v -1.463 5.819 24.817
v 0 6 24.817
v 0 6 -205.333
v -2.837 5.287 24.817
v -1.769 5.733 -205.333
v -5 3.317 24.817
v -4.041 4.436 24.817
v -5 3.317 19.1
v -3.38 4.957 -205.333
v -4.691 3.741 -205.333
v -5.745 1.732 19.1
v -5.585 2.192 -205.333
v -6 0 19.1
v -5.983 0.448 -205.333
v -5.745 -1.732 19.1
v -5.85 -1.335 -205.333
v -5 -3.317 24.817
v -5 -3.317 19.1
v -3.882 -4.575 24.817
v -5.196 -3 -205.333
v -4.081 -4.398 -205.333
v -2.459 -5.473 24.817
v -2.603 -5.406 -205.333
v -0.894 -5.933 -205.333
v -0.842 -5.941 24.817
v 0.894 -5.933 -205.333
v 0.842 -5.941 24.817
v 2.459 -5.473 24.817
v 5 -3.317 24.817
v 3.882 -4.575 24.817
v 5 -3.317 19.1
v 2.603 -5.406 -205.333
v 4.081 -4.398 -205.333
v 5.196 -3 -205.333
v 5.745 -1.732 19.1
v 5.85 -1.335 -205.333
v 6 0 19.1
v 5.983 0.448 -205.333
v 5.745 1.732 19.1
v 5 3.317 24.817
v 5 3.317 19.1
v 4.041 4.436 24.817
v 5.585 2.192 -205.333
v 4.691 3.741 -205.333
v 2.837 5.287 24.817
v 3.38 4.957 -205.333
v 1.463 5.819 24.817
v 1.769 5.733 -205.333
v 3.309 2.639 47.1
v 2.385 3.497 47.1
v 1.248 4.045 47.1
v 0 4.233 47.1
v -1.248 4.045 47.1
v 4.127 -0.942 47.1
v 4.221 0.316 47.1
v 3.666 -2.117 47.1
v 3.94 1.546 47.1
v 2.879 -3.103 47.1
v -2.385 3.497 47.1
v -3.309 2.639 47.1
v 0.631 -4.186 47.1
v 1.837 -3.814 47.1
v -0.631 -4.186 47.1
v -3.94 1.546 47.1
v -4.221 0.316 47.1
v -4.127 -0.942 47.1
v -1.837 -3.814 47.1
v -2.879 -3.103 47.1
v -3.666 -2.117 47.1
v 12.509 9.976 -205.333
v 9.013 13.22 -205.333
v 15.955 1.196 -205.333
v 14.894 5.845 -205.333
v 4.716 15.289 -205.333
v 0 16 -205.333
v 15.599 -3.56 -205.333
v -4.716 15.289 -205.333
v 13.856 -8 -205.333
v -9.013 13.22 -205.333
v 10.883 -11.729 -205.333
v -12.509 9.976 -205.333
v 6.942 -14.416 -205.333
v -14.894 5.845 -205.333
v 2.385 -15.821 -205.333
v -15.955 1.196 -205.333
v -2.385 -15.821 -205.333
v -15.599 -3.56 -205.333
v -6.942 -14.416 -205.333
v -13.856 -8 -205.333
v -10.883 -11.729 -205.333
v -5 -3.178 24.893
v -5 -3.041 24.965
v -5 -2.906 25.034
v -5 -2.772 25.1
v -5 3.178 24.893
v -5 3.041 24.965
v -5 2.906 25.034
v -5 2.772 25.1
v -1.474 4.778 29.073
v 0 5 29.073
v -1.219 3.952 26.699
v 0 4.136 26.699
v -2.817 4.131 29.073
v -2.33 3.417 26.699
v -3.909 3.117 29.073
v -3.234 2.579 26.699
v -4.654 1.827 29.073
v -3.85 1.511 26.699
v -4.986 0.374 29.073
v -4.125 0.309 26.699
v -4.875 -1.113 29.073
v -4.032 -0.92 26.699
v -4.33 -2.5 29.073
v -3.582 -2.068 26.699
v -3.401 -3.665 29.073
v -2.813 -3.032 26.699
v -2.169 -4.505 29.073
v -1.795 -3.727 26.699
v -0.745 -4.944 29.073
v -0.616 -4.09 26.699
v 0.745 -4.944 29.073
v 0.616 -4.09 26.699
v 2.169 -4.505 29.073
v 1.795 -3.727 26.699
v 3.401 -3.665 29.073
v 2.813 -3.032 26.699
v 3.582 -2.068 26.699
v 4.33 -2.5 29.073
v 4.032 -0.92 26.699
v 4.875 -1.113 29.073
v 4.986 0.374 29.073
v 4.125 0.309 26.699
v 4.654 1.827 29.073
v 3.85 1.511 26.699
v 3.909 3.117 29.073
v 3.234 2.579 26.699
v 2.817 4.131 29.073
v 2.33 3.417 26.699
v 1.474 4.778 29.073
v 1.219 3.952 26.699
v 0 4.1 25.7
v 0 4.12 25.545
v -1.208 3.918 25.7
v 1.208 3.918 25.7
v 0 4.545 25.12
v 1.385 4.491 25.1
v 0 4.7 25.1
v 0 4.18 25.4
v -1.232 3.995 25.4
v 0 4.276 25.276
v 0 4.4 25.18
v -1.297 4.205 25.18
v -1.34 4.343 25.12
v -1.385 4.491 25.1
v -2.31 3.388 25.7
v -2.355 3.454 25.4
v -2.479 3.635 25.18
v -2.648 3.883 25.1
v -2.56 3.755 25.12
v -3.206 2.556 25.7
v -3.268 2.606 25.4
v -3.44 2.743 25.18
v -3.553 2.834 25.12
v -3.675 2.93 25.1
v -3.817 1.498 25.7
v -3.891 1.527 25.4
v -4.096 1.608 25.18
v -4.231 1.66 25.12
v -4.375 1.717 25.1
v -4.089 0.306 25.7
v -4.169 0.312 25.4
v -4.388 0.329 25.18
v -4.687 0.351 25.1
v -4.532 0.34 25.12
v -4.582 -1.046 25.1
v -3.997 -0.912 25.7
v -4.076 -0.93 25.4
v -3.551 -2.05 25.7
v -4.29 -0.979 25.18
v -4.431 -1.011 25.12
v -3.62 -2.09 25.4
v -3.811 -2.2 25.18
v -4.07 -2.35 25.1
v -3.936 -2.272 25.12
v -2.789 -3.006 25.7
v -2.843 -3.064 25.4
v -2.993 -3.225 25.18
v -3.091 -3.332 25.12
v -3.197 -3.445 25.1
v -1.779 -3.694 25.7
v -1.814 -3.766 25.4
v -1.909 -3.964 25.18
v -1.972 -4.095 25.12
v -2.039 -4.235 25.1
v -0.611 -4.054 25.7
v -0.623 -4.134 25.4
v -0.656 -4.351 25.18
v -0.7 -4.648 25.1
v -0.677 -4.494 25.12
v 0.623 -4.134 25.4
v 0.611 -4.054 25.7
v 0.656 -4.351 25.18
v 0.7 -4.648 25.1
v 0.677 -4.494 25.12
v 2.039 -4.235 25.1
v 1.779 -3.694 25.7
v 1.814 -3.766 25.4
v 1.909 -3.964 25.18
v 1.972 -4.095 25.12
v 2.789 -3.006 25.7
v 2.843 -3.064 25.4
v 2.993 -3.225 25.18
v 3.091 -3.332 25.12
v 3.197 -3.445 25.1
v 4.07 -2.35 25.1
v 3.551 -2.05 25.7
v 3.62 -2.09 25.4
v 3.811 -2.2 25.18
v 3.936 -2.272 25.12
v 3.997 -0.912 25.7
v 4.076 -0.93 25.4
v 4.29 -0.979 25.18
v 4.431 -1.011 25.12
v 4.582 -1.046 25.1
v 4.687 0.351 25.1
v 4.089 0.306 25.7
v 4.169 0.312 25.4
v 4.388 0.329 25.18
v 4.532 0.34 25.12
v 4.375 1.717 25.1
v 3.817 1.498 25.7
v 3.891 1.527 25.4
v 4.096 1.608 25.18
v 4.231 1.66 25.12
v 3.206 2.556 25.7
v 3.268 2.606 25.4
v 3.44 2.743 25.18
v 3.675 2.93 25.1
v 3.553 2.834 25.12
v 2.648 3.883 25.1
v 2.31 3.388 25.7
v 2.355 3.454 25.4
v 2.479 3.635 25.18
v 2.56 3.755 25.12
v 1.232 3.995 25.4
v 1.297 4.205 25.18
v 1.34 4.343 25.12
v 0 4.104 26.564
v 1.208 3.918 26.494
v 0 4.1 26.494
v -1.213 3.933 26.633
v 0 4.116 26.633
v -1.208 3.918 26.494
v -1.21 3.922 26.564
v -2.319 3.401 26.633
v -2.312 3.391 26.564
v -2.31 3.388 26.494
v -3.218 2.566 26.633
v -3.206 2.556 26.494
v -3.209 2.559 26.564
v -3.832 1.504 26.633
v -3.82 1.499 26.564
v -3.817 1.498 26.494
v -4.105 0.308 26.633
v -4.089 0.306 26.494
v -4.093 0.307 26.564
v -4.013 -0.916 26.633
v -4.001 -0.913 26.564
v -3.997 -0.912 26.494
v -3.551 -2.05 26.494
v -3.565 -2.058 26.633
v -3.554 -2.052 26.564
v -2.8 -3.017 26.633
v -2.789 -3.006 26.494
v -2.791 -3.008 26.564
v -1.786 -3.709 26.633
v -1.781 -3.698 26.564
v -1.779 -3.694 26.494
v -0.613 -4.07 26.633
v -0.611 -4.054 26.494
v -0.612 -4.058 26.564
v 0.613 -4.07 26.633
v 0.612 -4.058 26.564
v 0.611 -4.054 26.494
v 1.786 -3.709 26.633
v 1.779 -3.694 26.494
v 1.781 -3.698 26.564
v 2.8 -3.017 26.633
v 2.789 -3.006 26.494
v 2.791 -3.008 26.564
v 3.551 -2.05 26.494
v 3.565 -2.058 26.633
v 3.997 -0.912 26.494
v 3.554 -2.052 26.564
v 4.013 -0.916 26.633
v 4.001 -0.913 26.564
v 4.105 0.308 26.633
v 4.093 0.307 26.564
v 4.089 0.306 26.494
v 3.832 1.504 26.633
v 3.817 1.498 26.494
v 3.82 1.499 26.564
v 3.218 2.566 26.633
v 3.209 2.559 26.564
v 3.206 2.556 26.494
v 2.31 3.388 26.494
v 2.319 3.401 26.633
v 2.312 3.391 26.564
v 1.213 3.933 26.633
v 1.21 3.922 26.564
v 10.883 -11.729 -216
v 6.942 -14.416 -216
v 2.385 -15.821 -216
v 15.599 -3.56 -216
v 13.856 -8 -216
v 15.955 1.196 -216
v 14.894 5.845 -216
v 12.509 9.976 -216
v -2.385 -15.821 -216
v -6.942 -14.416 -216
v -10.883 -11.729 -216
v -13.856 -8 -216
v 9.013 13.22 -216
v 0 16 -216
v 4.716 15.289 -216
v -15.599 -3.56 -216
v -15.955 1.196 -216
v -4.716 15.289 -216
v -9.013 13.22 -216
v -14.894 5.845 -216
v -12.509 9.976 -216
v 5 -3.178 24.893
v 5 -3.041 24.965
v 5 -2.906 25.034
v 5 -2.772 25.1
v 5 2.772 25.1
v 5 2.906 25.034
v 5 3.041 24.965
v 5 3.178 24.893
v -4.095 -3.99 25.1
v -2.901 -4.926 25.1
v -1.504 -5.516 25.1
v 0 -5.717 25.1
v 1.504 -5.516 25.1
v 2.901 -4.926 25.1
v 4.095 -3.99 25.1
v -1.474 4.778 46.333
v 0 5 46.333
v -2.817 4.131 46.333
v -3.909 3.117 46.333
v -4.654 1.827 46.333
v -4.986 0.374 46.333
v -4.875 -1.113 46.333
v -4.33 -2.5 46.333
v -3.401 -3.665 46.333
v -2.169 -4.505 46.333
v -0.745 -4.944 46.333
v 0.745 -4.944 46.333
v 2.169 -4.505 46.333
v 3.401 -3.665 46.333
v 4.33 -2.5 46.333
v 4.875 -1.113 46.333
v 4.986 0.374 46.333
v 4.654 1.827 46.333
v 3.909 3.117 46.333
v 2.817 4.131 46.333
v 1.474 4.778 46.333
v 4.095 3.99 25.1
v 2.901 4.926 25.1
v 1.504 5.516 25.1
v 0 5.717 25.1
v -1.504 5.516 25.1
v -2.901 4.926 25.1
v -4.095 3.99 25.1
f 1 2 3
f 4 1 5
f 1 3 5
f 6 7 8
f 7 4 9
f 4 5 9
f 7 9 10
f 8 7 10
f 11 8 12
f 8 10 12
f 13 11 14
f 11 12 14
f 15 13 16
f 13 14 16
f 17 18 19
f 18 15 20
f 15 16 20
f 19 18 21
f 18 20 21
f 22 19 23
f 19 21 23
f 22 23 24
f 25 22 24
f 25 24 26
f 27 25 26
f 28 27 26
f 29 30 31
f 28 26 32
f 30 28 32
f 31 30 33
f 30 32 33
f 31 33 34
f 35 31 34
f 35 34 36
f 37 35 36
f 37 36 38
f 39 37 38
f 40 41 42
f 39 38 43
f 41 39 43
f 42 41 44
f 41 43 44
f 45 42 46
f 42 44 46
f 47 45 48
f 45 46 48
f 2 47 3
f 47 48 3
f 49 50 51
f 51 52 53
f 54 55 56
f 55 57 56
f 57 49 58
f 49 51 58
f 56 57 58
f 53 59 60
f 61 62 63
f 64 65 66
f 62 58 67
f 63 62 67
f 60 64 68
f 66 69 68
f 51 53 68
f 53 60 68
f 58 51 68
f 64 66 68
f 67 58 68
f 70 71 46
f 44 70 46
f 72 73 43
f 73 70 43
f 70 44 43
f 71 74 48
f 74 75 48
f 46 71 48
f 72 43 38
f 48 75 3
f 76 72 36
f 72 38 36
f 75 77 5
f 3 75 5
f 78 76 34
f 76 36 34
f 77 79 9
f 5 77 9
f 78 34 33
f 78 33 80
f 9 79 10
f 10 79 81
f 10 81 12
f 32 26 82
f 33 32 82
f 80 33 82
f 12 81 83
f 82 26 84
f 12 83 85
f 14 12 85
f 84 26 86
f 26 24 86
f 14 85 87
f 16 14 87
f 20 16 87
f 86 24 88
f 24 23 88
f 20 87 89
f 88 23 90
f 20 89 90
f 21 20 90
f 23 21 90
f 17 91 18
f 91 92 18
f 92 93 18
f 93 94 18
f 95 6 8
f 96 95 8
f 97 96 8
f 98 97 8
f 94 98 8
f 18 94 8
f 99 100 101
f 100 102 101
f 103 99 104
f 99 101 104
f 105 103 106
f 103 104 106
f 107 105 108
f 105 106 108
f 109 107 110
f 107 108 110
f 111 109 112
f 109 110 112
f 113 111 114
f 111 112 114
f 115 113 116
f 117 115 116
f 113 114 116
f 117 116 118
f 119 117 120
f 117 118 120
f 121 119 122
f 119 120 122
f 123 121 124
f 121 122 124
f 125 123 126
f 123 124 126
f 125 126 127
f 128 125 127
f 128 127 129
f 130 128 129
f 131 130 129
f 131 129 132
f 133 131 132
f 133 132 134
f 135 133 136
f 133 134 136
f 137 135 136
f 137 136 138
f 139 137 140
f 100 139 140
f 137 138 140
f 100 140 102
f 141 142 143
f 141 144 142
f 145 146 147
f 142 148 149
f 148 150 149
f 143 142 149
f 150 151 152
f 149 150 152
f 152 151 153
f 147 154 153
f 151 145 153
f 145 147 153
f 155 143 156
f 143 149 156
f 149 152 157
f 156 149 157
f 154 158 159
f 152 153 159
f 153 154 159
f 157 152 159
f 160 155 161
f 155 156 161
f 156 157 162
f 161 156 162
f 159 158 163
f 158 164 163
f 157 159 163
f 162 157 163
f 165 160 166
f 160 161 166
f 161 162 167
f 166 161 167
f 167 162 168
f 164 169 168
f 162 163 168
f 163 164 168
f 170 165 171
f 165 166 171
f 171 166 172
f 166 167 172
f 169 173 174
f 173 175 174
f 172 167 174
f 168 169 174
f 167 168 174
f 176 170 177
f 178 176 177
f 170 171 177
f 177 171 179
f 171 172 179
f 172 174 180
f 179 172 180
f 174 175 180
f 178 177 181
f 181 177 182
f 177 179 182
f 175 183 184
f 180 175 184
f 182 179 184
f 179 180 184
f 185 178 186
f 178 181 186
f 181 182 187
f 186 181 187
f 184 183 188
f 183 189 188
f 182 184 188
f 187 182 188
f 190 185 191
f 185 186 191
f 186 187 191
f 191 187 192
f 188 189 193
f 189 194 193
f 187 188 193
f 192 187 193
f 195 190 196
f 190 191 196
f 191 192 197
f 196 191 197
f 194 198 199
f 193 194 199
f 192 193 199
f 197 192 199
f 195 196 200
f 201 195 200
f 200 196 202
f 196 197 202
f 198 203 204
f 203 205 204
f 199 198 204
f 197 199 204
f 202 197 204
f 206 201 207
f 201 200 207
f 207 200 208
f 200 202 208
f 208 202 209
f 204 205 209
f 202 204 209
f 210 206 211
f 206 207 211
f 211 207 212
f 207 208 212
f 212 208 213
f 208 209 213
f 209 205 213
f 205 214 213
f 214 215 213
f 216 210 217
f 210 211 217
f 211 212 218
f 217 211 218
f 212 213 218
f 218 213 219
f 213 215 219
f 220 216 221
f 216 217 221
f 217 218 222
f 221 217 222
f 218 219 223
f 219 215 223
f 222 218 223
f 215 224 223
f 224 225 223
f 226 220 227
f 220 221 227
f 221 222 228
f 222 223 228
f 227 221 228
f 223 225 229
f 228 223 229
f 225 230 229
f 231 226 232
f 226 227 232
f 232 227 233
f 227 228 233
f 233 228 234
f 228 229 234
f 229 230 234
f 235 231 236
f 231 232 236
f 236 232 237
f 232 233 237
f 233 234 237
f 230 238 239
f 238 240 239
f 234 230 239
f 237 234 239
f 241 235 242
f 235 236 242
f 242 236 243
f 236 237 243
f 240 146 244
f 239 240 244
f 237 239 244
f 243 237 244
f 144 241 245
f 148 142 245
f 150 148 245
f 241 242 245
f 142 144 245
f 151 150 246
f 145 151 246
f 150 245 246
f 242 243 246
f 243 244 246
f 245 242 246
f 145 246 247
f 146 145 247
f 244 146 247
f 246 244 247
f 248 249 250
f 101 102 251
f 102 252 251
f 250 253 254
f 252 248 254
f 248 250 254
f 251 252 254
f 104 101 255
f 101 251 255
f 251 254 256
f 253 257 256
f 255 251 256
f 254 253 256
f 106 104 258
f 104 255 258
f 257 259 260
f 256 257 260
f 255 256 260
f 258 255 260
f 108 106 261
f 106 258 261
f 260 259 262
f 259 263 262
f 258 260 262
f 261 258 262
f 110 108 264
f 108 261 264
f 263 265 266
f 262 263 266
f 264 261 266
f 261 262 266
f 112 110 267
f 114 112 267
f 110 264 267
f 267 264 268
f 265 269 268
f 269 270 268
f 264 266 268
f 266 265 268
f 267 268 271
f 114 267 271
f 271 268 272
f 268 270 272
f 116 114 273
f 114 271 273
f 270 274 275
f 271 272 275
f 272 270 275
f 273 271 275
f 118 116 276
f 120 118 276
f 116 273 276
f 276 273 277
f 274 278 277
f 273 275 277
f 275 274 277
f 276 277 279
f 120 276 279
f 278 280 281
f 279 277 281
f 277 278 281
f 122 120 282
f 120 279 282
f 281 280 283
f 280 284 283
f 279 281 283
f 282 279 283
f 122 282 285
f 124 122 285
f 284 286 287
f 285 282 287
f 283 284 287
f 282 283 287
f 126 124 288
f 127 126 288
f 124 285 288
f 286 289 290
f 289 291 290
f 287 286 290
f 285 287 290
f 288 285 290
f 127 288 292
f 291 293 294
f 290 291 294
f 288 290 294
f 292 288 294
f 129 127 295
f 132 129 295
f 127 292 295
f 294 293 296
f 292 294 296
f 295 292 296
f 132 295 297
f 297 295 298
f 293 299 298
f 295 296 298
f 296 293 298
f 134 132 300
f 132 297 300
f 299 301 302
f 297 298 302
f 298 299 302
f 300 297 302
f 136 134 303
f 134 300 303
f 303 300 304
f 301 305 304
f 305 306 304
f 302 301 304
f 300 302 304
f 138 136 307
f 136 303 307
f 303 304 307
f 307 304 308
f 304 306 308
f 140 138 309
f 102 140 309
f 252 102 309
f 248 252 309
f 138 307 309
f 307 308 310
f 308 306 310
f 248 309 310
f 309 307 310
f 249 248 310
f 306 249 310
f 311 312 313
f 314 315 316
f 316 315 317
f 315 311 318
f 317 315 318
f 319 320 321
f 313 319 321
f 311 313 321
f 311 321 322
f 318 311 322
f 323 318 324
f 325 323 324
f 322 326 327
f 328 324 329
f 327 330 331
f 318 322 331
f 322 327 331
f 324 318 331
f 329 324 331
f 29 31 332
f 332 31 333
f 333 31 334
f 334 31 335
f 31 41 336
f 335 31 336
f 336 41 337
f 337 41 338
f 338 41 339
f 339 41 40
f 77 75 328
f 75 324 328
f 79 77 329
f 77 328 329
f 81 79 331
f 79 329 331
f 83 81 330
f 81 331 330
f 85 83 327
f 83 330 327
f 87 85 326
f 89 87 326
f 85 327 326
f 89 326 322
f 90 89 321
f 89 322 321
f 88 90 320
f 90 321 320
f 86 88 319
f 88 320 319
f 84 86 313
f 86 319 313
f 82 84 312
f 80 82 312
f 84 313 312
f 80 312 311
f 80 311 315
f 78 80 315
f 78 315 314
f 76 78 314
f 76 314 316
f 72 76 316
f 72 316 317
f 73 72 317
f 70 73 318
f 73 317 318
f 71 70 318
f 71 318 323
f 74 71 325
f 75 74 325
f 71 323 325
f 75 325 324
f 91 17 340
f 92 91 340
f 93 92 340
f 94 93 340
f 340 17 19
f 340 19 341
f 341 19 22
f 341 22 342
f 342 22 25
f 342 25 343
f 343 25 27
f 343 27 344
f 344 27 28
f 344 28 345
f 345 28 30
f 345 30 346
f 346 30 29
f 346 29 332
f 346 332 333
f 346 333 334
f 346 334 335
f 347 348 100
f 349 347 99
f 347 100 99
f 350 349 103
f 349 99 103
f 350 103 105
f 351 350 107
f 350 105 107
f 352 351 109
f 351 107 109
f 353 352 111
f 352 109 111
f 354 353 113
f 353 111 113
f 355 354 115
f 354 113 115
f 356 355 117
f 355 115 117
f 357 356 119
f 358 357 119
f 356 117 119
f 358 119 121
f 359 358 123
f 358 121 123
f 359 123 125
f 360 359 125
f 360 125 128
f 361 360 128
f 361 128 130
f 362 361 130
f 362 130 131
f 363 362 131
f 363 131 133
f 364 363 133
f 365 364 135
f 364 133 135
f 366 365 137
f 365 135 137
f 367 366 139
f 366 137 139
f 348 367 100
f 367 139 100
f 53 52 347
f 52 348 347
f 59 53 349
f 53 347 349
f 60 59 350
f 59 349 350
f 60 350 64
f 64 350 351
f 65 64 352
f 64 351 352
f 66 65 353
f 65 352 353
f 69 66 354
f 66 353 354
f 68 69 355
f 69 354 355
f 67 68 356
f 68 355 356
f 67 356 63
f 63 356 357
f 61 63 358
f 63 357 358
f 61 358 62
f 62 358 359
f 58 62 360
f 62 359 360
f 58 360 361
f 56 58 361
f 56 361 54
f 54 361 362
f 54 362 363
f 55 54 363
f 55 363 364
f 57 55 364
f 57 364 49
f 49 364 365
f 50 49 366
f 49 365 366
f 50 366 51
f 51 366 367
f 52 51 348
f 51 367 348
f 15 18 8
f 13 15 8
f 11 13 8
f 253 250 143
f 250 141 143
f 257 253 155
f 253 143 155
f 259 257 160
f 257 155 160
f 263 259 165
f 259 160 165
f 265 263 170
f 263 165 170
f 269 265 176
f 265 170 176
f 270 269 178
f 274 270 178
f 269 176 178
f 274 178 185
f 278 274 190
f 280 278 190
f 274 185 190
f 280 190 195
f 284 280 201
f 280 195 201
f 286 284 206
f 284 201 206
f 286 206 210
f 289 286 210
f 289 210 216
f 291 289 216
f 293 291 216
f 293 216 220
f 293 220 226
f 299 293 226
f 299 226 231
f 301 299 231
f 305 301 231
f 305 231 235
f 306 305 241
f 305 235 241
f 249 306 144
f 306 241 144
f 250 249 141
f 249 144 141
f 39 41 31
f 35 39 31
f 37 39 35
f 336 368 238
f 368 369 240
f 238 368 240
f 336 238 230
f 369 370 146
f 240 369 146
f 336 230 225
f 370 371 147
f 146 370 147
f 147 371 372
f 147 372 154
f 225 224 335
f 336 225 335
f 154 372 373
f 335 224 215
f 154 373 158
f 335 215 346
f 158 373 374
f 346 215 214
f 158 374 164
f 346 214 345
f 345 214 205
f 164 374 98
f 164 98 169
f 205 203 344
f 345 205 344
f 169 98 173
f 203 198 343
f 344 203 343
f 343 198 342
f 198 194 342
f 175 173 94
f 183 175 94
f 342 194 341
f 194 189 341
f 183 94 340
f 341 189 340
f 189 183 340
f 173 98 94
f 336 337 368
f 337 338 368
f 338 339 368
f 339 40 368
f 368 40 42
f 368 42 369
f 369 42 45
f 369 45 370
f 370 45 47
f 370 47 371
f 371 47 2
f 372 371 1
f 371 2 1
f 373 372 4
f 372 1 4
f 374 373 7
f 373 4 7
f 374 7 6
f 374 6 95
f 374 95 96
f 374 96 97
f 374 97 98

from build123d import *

# Parameters (mm, degrees)
CUT_EXTRUDE1_DEPTH      = 10
CUT_EXTRUDE1_DEPTH_BACK = 10


with BuildPart() as part:
    # Sketch1 → Revolve1 (revolve)
    with BuildSketch(Plane(origin=(0, 0, 0), x_dir=(0, 0, -1), z_dir=(1, 0, 0))):
        Polygon((-25.1, 0), (-25.1, 5.717157288), (-24.817157288, 6), (205.333333333, 6), (205.333333333, 16), (216, 16), (216, 0), align=None)
    revolve(axis=Axis((0, 0, -216), (0, 0, 1)))

    # Sketch2 → Cut-Extrude1 (cut, two sides: drawn at the far end of the back side and taken through both)
    with BuildSketch(Plane(origin=(0, 0, 0), x_dir=(1, 0, 0), z_dir=(0, 1, 0)).offset(-CUT_EXTRUDE1_DEPTH_BACK)):
        Polygon((-10, -39.1), (10, -39.1), (10, -19.1), (5, -19.1), (5, -31.1), (-5, -31.1), (-5, -19.1), (-10, -19.1), align=None)
    extrude(amount=CUT_EXTRUDE1_DEPTH + CUT_EXTRUDE1_DEPTH_BACK, mode=Mode.SUBTRACT)

    # Sketch3 → Revolve2 (revolve)
    with BuildSketch(Plane(origin=(0, 0, 0), x_dir=(0, 0, -1), z_dir=(1, 0, 0))):
        with BuildLine():
            Line((-47.1, 0), (-47.1, 4.233))
            Line((-47.1, 4.233), (-46.333, 5))
            Line((-46.333, 5), (-29.072729678, 5))
            Line((-29.072729678, 5), (-26.699415898, 4.136184428))
            ThreePointArc((-26.699415898, 4.136184428), (-26.598392718, 4.109115348), (-26.494203812, 4.1))
            Line((-26.494203812, 4.1), (-25.7, 4.1))
            ThreePointArc((-25.7, 4.1), (-25.275735931, 4.275735931), (-25.1, 4.7))
            Line((-25.1, 4.7), (-24.5, 4.7))
            Line((-24.5, 4.7), (-24.5, 0))
            Line((-24.5, 0), (-47.1, 0))
        make_face()
    revolve(axis=Axis((0, 0, 24.5), (0, 0, 1)))


solid = part.part
